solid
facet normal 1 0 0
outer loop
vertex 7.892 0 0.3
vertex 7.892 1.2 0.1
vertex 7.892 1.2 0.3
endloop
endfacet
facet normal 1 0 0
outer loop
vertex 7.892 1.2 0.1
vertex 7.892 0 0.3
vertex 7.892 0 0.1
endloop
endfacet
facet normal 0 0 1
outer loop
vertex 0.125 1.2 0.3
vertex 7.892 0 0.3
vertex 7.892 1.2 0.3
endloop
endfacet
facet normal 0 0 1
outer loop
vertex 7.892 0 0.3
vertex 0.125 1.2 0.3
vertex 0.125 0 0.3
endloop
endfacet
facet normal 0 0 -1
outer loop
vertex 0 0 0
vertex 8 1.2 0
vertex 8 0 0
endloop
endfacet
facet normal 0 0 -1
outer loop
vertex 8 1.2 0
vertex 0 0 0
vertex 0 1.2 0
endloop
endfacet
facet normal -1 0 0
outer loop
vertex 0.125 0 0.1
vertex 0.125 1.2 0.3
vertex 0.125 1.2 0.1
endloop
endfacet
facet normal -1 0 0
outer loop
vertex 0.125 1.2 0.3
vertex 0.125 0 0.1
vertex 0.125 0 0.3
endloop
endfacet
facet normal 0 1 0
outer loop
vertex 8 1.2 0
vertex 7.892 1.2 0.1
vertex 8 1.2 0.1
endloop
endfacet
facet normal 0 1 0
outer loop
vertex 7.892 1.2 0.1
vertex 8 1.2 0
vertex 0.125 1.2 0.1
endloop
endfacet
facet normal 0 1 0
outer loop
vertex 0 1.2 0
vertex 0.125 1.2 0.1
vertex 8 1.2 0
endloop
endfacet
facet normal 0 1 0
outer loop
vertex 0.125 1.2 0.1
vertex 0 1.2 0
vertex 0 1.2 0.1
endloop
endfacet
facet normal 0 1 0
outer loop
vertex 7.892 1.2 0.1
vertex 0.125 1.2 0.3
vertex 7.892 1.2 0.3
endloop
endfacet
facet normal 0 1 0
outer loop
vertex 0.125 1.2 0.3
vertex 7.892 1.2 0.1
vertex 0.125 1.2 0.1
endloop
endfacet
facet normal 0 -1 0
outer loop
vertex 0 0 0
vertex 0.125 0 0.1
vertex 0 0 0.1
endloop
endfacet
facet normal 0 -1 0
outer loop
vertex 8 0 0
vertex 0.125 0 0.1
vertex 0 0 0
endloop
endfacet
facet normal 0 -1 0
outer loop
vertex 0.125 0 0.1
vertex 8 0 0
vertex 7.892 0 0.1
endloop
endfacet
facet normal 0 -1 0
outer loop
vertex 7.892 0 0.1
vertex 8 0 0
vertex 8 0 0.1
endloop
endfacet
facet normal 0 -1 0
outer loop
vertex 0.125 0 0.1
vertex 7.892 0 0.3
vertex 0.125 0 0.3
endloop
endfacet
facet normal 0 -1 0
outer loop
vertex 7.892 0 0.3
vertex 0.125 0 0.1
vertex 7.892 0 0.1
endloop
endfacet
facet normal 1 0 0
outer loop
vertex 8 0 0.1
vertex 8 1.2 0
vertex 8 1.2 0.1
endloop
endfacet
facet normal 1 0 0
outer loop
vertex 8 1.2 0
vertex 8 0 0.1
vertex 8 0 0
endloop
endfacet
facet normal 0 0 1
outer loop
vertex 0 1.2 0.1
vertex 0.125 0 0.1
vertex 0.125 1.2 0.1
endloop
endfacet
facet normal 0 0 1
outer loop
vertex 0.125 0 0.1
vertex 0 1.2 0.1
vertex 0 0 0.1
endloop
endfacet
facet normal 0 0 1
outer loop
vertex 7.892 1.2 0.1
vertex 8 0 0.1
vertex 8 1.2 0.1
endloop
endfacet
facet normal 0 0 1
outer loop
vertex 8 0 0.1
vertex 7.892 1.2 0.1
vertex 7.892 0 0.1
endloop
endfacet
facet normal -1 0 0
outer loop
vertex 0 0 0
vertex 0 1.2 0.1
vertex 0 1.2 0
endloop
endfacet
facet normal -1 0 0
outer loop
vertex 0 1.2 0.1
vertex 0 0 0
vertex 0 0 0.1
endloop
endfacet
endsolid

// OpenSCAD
$fn = 100; 

module trackerLogo(thickness) {
  difference() {
   cube([7.767, 1.2, thickness]);
    translate ([-.01,-.01,-.01]) {
      linear_extrude(height = thickness * 2, convexity = 50) 
      import(file = "/Users/andy/Dropbox/Things/tracker-logo/logo.dxf");
		}
	}
}

cube([8, 1.2, .1]);
translate([.125, 0, 0]) trackerLogo(.3);
